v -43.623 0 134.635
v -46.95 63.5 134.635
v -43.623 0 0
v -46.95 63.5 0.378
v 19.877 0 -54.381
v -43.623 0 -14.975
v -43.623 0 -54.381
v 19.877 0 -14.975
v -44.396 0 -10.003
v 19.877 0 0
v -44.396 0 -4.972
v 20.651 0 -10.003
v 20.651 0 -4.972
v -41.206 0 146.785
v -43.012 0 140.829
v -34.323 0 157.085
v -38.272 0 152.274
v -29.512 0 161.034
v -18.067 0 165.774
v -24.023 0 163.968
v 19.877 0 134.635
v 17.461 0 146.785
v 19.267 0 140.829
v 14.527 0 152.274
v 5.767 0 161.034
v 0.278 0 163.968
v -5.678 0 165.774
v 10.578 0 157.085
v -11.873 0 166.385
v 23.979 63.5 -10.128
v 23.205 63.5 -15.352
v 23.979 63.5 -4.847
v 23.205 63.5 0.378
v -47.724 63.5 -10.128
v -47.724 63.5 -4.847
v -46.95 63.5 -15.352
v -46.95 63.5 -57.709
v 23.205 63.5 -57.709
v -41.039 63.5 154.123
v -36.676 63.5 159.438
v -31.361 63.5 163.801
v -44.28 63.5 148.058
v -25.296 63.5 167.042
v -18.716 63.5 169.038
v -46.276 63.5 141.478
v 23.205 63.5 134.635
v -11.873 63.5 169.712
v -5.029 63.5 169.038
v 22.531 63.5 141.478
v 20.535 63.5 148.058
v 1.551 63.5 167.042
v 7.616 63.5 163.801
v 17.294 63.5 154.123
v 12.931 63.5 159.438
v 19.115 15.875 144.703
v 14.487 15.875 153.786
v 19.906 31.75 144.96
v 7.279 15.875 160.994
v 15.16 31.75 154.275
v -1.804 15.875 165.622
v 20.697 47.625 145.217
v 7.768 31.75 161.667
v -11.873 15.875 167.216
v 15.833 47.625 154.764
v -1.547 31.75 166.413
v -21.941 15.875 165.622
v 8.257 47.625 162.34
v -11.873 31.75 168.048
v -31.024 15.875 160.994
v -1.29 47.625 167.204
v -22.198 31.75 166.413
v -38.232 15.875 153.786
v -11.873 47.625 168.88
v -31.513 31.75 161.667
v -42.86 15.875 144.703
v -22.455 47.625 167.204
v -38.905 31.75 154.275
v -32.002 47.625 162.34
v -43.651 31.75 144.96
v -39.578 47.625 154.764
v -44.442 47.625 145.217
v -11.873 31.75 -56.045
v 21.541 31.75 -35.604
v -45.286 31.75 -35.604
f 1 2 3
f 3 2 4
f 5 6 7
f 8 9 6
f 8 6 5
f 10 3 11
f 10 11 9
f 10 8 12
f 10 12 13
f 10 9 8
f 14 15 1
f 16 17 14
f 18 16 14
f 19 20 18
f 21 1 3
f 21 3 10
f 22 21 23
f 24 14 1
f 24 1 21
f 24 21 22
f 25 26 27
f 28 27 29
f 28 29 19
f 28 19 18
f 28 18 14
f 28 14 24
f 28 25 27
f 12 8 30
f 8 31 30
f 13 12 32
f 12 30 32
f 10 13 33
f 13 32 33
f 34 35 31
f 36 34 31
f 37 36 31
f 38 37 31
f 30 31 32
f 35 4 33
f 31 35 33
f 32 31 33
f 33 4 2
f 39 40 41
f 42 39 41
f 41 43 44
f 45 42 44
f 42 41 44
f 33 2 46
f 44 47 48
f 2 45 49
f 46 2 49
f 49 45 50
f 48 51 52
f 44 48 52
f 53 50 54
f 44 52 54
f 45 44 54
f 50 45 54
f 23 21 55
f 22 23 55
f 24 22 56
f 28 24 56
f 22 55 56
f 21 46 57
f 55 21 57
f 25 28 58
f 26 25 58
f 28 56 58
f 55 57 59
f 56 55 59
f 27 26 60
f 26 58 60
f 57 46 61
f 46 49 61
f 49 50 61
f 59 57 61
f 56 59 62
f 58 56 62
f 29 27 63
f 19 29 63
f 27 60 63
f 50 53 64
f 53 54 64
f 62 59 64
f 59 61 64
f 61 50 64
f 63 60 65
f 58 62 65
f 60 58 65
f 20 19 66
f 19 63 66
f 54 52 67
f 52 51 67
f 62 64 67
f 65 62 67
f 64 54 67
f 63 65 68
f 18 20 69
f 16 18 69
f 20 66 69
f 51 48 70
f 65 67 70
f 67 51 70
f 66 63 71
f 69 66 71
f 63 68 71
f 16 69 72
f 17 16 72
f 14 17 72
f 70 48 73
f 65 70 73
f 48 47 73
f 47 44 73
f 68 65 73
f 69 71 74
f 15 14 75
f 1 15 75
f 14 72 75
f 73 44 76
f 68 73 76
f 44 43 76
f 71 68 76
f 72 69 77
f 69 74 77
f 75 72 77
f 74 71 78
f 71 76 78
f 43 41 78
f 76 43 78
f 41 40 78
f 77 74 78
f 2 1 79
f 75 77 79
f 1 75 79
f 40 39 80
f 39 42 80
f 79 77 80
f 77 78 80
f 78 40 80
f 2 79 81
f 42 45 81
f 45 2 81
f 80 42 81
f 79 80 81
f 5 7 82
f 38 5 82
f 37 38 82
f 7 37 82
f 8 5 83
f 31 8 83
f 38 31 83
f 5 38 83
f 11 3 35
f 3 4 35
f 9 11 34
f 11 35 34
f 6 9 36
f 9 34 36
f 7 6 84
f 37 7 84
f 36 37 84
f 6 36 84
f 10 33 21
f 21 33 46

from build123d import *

# Parameters (mm, degrees)
F1_DEPTH = 63.5
F1_TAPER = -3


with BuildPart() as f1:
    # F0 (on Front) → F1 (new body)
    with BuildSketch(Plane.XZ):
        with BuildLine():
            ThreePointArc((19.8774547922, 134.6345158583), (-11.8725452078, 166.3845158583), (-43.6225452078, 134.6345158583))
            Line((-43.6225452078, 134.6345158583), (-11.8725452078, 134.6345158583))
            Line((-11.8725452078, 134.6345158583), (19.8774547922, 134.6345158583))
        make_face()
        with BuildLine():
            Line((-11.8725452078, 134.6345158583), (-43.6225452078, 134.6345158583))
            Line((-43.6225452078, 134.6345158583), (-43.6225452078, 0))
            Line((-43.6225452078, 0), (-43.6225452078, -14.9748003857))
            ThreePointArc((-43.6225452078, -14.9748003857), (-32.119493943, -33.0644353721), (-11.8725452078, -40.1083085439))
            Line((-11.8725452078, -40.1083085439), (-11.8725452078, 134.6345158583))
        make_face()
        with BuildLine():
            Line((19.8774547922, 134.6345158583), (-11.8725452078, 134.6345158583))
            Line((-11.8725452078, 134.6345158583), (-11.8725452078, -40.1083085439))
            ThreePointArc((-11.8725452078, -40.1083085439), (8.3744035274, -33.0644353721), (19.8774547922, -14.9748003857))
            Line((19.8774547922, -14.9748003857), (19.8774547922, 0))
            Line((19.8774547922, 0), (19.8774547922, 134.6345158583))
        make_face()
        with BuildLine():
            Line((-43.6225452078, -14.9748003857), (-43.6225452078, 0))
            ThreePointArc((-43.6225452078, 0), (-44.4934535588, -7.4874001928), (-43.6225452078, -14.9748003857))
        make_face()
        with BuildLine():
            ThreePointArc((19.8774547922, -14.9748003857), (8.3744035274, -33.0644353721), (-11.8725452078, -40.1083085439))
            Line((-11.8725452078, -40.1083085439), (-11.8725452078, -54.3808022202))
            Line((-11.8725452078, -54.3808022202), (19.8774547922, -54.3808022202))
            Line((19.8774547922, -54.3808022202), (19.8774547922, -14.9748003857))
        make_face()
        with BuildLine():
            Line((-11.8725452078, -54.3808022202), (-11.8725452078, -40.1083085439))
            ThreePointArc((-11.8725452078, -40.1083085439), (-32.119493943, -33.0644353721), (-43.6225452078, -14.9748003857))
            Line((-43.6225452078, -14.9748003857), (-43.6225452078, -54.3808022202))
            Line((-43.6225452078, -54.3808022202), (-11.8725452078, -54.3808022202))
        make_face()
        with BuildLine():
            ThreePointArc((19.8774547922, -14.9748003857), (20.7483631433, -7.4874001928), (19.8774547922, 0))
            Line((19.8774547922, 0), (19.8774547922, -14.9748003857))
        make_face()
    extrude(amount=-F1_DEPTH, taper=F1_TAPER)


solid = f1.part
